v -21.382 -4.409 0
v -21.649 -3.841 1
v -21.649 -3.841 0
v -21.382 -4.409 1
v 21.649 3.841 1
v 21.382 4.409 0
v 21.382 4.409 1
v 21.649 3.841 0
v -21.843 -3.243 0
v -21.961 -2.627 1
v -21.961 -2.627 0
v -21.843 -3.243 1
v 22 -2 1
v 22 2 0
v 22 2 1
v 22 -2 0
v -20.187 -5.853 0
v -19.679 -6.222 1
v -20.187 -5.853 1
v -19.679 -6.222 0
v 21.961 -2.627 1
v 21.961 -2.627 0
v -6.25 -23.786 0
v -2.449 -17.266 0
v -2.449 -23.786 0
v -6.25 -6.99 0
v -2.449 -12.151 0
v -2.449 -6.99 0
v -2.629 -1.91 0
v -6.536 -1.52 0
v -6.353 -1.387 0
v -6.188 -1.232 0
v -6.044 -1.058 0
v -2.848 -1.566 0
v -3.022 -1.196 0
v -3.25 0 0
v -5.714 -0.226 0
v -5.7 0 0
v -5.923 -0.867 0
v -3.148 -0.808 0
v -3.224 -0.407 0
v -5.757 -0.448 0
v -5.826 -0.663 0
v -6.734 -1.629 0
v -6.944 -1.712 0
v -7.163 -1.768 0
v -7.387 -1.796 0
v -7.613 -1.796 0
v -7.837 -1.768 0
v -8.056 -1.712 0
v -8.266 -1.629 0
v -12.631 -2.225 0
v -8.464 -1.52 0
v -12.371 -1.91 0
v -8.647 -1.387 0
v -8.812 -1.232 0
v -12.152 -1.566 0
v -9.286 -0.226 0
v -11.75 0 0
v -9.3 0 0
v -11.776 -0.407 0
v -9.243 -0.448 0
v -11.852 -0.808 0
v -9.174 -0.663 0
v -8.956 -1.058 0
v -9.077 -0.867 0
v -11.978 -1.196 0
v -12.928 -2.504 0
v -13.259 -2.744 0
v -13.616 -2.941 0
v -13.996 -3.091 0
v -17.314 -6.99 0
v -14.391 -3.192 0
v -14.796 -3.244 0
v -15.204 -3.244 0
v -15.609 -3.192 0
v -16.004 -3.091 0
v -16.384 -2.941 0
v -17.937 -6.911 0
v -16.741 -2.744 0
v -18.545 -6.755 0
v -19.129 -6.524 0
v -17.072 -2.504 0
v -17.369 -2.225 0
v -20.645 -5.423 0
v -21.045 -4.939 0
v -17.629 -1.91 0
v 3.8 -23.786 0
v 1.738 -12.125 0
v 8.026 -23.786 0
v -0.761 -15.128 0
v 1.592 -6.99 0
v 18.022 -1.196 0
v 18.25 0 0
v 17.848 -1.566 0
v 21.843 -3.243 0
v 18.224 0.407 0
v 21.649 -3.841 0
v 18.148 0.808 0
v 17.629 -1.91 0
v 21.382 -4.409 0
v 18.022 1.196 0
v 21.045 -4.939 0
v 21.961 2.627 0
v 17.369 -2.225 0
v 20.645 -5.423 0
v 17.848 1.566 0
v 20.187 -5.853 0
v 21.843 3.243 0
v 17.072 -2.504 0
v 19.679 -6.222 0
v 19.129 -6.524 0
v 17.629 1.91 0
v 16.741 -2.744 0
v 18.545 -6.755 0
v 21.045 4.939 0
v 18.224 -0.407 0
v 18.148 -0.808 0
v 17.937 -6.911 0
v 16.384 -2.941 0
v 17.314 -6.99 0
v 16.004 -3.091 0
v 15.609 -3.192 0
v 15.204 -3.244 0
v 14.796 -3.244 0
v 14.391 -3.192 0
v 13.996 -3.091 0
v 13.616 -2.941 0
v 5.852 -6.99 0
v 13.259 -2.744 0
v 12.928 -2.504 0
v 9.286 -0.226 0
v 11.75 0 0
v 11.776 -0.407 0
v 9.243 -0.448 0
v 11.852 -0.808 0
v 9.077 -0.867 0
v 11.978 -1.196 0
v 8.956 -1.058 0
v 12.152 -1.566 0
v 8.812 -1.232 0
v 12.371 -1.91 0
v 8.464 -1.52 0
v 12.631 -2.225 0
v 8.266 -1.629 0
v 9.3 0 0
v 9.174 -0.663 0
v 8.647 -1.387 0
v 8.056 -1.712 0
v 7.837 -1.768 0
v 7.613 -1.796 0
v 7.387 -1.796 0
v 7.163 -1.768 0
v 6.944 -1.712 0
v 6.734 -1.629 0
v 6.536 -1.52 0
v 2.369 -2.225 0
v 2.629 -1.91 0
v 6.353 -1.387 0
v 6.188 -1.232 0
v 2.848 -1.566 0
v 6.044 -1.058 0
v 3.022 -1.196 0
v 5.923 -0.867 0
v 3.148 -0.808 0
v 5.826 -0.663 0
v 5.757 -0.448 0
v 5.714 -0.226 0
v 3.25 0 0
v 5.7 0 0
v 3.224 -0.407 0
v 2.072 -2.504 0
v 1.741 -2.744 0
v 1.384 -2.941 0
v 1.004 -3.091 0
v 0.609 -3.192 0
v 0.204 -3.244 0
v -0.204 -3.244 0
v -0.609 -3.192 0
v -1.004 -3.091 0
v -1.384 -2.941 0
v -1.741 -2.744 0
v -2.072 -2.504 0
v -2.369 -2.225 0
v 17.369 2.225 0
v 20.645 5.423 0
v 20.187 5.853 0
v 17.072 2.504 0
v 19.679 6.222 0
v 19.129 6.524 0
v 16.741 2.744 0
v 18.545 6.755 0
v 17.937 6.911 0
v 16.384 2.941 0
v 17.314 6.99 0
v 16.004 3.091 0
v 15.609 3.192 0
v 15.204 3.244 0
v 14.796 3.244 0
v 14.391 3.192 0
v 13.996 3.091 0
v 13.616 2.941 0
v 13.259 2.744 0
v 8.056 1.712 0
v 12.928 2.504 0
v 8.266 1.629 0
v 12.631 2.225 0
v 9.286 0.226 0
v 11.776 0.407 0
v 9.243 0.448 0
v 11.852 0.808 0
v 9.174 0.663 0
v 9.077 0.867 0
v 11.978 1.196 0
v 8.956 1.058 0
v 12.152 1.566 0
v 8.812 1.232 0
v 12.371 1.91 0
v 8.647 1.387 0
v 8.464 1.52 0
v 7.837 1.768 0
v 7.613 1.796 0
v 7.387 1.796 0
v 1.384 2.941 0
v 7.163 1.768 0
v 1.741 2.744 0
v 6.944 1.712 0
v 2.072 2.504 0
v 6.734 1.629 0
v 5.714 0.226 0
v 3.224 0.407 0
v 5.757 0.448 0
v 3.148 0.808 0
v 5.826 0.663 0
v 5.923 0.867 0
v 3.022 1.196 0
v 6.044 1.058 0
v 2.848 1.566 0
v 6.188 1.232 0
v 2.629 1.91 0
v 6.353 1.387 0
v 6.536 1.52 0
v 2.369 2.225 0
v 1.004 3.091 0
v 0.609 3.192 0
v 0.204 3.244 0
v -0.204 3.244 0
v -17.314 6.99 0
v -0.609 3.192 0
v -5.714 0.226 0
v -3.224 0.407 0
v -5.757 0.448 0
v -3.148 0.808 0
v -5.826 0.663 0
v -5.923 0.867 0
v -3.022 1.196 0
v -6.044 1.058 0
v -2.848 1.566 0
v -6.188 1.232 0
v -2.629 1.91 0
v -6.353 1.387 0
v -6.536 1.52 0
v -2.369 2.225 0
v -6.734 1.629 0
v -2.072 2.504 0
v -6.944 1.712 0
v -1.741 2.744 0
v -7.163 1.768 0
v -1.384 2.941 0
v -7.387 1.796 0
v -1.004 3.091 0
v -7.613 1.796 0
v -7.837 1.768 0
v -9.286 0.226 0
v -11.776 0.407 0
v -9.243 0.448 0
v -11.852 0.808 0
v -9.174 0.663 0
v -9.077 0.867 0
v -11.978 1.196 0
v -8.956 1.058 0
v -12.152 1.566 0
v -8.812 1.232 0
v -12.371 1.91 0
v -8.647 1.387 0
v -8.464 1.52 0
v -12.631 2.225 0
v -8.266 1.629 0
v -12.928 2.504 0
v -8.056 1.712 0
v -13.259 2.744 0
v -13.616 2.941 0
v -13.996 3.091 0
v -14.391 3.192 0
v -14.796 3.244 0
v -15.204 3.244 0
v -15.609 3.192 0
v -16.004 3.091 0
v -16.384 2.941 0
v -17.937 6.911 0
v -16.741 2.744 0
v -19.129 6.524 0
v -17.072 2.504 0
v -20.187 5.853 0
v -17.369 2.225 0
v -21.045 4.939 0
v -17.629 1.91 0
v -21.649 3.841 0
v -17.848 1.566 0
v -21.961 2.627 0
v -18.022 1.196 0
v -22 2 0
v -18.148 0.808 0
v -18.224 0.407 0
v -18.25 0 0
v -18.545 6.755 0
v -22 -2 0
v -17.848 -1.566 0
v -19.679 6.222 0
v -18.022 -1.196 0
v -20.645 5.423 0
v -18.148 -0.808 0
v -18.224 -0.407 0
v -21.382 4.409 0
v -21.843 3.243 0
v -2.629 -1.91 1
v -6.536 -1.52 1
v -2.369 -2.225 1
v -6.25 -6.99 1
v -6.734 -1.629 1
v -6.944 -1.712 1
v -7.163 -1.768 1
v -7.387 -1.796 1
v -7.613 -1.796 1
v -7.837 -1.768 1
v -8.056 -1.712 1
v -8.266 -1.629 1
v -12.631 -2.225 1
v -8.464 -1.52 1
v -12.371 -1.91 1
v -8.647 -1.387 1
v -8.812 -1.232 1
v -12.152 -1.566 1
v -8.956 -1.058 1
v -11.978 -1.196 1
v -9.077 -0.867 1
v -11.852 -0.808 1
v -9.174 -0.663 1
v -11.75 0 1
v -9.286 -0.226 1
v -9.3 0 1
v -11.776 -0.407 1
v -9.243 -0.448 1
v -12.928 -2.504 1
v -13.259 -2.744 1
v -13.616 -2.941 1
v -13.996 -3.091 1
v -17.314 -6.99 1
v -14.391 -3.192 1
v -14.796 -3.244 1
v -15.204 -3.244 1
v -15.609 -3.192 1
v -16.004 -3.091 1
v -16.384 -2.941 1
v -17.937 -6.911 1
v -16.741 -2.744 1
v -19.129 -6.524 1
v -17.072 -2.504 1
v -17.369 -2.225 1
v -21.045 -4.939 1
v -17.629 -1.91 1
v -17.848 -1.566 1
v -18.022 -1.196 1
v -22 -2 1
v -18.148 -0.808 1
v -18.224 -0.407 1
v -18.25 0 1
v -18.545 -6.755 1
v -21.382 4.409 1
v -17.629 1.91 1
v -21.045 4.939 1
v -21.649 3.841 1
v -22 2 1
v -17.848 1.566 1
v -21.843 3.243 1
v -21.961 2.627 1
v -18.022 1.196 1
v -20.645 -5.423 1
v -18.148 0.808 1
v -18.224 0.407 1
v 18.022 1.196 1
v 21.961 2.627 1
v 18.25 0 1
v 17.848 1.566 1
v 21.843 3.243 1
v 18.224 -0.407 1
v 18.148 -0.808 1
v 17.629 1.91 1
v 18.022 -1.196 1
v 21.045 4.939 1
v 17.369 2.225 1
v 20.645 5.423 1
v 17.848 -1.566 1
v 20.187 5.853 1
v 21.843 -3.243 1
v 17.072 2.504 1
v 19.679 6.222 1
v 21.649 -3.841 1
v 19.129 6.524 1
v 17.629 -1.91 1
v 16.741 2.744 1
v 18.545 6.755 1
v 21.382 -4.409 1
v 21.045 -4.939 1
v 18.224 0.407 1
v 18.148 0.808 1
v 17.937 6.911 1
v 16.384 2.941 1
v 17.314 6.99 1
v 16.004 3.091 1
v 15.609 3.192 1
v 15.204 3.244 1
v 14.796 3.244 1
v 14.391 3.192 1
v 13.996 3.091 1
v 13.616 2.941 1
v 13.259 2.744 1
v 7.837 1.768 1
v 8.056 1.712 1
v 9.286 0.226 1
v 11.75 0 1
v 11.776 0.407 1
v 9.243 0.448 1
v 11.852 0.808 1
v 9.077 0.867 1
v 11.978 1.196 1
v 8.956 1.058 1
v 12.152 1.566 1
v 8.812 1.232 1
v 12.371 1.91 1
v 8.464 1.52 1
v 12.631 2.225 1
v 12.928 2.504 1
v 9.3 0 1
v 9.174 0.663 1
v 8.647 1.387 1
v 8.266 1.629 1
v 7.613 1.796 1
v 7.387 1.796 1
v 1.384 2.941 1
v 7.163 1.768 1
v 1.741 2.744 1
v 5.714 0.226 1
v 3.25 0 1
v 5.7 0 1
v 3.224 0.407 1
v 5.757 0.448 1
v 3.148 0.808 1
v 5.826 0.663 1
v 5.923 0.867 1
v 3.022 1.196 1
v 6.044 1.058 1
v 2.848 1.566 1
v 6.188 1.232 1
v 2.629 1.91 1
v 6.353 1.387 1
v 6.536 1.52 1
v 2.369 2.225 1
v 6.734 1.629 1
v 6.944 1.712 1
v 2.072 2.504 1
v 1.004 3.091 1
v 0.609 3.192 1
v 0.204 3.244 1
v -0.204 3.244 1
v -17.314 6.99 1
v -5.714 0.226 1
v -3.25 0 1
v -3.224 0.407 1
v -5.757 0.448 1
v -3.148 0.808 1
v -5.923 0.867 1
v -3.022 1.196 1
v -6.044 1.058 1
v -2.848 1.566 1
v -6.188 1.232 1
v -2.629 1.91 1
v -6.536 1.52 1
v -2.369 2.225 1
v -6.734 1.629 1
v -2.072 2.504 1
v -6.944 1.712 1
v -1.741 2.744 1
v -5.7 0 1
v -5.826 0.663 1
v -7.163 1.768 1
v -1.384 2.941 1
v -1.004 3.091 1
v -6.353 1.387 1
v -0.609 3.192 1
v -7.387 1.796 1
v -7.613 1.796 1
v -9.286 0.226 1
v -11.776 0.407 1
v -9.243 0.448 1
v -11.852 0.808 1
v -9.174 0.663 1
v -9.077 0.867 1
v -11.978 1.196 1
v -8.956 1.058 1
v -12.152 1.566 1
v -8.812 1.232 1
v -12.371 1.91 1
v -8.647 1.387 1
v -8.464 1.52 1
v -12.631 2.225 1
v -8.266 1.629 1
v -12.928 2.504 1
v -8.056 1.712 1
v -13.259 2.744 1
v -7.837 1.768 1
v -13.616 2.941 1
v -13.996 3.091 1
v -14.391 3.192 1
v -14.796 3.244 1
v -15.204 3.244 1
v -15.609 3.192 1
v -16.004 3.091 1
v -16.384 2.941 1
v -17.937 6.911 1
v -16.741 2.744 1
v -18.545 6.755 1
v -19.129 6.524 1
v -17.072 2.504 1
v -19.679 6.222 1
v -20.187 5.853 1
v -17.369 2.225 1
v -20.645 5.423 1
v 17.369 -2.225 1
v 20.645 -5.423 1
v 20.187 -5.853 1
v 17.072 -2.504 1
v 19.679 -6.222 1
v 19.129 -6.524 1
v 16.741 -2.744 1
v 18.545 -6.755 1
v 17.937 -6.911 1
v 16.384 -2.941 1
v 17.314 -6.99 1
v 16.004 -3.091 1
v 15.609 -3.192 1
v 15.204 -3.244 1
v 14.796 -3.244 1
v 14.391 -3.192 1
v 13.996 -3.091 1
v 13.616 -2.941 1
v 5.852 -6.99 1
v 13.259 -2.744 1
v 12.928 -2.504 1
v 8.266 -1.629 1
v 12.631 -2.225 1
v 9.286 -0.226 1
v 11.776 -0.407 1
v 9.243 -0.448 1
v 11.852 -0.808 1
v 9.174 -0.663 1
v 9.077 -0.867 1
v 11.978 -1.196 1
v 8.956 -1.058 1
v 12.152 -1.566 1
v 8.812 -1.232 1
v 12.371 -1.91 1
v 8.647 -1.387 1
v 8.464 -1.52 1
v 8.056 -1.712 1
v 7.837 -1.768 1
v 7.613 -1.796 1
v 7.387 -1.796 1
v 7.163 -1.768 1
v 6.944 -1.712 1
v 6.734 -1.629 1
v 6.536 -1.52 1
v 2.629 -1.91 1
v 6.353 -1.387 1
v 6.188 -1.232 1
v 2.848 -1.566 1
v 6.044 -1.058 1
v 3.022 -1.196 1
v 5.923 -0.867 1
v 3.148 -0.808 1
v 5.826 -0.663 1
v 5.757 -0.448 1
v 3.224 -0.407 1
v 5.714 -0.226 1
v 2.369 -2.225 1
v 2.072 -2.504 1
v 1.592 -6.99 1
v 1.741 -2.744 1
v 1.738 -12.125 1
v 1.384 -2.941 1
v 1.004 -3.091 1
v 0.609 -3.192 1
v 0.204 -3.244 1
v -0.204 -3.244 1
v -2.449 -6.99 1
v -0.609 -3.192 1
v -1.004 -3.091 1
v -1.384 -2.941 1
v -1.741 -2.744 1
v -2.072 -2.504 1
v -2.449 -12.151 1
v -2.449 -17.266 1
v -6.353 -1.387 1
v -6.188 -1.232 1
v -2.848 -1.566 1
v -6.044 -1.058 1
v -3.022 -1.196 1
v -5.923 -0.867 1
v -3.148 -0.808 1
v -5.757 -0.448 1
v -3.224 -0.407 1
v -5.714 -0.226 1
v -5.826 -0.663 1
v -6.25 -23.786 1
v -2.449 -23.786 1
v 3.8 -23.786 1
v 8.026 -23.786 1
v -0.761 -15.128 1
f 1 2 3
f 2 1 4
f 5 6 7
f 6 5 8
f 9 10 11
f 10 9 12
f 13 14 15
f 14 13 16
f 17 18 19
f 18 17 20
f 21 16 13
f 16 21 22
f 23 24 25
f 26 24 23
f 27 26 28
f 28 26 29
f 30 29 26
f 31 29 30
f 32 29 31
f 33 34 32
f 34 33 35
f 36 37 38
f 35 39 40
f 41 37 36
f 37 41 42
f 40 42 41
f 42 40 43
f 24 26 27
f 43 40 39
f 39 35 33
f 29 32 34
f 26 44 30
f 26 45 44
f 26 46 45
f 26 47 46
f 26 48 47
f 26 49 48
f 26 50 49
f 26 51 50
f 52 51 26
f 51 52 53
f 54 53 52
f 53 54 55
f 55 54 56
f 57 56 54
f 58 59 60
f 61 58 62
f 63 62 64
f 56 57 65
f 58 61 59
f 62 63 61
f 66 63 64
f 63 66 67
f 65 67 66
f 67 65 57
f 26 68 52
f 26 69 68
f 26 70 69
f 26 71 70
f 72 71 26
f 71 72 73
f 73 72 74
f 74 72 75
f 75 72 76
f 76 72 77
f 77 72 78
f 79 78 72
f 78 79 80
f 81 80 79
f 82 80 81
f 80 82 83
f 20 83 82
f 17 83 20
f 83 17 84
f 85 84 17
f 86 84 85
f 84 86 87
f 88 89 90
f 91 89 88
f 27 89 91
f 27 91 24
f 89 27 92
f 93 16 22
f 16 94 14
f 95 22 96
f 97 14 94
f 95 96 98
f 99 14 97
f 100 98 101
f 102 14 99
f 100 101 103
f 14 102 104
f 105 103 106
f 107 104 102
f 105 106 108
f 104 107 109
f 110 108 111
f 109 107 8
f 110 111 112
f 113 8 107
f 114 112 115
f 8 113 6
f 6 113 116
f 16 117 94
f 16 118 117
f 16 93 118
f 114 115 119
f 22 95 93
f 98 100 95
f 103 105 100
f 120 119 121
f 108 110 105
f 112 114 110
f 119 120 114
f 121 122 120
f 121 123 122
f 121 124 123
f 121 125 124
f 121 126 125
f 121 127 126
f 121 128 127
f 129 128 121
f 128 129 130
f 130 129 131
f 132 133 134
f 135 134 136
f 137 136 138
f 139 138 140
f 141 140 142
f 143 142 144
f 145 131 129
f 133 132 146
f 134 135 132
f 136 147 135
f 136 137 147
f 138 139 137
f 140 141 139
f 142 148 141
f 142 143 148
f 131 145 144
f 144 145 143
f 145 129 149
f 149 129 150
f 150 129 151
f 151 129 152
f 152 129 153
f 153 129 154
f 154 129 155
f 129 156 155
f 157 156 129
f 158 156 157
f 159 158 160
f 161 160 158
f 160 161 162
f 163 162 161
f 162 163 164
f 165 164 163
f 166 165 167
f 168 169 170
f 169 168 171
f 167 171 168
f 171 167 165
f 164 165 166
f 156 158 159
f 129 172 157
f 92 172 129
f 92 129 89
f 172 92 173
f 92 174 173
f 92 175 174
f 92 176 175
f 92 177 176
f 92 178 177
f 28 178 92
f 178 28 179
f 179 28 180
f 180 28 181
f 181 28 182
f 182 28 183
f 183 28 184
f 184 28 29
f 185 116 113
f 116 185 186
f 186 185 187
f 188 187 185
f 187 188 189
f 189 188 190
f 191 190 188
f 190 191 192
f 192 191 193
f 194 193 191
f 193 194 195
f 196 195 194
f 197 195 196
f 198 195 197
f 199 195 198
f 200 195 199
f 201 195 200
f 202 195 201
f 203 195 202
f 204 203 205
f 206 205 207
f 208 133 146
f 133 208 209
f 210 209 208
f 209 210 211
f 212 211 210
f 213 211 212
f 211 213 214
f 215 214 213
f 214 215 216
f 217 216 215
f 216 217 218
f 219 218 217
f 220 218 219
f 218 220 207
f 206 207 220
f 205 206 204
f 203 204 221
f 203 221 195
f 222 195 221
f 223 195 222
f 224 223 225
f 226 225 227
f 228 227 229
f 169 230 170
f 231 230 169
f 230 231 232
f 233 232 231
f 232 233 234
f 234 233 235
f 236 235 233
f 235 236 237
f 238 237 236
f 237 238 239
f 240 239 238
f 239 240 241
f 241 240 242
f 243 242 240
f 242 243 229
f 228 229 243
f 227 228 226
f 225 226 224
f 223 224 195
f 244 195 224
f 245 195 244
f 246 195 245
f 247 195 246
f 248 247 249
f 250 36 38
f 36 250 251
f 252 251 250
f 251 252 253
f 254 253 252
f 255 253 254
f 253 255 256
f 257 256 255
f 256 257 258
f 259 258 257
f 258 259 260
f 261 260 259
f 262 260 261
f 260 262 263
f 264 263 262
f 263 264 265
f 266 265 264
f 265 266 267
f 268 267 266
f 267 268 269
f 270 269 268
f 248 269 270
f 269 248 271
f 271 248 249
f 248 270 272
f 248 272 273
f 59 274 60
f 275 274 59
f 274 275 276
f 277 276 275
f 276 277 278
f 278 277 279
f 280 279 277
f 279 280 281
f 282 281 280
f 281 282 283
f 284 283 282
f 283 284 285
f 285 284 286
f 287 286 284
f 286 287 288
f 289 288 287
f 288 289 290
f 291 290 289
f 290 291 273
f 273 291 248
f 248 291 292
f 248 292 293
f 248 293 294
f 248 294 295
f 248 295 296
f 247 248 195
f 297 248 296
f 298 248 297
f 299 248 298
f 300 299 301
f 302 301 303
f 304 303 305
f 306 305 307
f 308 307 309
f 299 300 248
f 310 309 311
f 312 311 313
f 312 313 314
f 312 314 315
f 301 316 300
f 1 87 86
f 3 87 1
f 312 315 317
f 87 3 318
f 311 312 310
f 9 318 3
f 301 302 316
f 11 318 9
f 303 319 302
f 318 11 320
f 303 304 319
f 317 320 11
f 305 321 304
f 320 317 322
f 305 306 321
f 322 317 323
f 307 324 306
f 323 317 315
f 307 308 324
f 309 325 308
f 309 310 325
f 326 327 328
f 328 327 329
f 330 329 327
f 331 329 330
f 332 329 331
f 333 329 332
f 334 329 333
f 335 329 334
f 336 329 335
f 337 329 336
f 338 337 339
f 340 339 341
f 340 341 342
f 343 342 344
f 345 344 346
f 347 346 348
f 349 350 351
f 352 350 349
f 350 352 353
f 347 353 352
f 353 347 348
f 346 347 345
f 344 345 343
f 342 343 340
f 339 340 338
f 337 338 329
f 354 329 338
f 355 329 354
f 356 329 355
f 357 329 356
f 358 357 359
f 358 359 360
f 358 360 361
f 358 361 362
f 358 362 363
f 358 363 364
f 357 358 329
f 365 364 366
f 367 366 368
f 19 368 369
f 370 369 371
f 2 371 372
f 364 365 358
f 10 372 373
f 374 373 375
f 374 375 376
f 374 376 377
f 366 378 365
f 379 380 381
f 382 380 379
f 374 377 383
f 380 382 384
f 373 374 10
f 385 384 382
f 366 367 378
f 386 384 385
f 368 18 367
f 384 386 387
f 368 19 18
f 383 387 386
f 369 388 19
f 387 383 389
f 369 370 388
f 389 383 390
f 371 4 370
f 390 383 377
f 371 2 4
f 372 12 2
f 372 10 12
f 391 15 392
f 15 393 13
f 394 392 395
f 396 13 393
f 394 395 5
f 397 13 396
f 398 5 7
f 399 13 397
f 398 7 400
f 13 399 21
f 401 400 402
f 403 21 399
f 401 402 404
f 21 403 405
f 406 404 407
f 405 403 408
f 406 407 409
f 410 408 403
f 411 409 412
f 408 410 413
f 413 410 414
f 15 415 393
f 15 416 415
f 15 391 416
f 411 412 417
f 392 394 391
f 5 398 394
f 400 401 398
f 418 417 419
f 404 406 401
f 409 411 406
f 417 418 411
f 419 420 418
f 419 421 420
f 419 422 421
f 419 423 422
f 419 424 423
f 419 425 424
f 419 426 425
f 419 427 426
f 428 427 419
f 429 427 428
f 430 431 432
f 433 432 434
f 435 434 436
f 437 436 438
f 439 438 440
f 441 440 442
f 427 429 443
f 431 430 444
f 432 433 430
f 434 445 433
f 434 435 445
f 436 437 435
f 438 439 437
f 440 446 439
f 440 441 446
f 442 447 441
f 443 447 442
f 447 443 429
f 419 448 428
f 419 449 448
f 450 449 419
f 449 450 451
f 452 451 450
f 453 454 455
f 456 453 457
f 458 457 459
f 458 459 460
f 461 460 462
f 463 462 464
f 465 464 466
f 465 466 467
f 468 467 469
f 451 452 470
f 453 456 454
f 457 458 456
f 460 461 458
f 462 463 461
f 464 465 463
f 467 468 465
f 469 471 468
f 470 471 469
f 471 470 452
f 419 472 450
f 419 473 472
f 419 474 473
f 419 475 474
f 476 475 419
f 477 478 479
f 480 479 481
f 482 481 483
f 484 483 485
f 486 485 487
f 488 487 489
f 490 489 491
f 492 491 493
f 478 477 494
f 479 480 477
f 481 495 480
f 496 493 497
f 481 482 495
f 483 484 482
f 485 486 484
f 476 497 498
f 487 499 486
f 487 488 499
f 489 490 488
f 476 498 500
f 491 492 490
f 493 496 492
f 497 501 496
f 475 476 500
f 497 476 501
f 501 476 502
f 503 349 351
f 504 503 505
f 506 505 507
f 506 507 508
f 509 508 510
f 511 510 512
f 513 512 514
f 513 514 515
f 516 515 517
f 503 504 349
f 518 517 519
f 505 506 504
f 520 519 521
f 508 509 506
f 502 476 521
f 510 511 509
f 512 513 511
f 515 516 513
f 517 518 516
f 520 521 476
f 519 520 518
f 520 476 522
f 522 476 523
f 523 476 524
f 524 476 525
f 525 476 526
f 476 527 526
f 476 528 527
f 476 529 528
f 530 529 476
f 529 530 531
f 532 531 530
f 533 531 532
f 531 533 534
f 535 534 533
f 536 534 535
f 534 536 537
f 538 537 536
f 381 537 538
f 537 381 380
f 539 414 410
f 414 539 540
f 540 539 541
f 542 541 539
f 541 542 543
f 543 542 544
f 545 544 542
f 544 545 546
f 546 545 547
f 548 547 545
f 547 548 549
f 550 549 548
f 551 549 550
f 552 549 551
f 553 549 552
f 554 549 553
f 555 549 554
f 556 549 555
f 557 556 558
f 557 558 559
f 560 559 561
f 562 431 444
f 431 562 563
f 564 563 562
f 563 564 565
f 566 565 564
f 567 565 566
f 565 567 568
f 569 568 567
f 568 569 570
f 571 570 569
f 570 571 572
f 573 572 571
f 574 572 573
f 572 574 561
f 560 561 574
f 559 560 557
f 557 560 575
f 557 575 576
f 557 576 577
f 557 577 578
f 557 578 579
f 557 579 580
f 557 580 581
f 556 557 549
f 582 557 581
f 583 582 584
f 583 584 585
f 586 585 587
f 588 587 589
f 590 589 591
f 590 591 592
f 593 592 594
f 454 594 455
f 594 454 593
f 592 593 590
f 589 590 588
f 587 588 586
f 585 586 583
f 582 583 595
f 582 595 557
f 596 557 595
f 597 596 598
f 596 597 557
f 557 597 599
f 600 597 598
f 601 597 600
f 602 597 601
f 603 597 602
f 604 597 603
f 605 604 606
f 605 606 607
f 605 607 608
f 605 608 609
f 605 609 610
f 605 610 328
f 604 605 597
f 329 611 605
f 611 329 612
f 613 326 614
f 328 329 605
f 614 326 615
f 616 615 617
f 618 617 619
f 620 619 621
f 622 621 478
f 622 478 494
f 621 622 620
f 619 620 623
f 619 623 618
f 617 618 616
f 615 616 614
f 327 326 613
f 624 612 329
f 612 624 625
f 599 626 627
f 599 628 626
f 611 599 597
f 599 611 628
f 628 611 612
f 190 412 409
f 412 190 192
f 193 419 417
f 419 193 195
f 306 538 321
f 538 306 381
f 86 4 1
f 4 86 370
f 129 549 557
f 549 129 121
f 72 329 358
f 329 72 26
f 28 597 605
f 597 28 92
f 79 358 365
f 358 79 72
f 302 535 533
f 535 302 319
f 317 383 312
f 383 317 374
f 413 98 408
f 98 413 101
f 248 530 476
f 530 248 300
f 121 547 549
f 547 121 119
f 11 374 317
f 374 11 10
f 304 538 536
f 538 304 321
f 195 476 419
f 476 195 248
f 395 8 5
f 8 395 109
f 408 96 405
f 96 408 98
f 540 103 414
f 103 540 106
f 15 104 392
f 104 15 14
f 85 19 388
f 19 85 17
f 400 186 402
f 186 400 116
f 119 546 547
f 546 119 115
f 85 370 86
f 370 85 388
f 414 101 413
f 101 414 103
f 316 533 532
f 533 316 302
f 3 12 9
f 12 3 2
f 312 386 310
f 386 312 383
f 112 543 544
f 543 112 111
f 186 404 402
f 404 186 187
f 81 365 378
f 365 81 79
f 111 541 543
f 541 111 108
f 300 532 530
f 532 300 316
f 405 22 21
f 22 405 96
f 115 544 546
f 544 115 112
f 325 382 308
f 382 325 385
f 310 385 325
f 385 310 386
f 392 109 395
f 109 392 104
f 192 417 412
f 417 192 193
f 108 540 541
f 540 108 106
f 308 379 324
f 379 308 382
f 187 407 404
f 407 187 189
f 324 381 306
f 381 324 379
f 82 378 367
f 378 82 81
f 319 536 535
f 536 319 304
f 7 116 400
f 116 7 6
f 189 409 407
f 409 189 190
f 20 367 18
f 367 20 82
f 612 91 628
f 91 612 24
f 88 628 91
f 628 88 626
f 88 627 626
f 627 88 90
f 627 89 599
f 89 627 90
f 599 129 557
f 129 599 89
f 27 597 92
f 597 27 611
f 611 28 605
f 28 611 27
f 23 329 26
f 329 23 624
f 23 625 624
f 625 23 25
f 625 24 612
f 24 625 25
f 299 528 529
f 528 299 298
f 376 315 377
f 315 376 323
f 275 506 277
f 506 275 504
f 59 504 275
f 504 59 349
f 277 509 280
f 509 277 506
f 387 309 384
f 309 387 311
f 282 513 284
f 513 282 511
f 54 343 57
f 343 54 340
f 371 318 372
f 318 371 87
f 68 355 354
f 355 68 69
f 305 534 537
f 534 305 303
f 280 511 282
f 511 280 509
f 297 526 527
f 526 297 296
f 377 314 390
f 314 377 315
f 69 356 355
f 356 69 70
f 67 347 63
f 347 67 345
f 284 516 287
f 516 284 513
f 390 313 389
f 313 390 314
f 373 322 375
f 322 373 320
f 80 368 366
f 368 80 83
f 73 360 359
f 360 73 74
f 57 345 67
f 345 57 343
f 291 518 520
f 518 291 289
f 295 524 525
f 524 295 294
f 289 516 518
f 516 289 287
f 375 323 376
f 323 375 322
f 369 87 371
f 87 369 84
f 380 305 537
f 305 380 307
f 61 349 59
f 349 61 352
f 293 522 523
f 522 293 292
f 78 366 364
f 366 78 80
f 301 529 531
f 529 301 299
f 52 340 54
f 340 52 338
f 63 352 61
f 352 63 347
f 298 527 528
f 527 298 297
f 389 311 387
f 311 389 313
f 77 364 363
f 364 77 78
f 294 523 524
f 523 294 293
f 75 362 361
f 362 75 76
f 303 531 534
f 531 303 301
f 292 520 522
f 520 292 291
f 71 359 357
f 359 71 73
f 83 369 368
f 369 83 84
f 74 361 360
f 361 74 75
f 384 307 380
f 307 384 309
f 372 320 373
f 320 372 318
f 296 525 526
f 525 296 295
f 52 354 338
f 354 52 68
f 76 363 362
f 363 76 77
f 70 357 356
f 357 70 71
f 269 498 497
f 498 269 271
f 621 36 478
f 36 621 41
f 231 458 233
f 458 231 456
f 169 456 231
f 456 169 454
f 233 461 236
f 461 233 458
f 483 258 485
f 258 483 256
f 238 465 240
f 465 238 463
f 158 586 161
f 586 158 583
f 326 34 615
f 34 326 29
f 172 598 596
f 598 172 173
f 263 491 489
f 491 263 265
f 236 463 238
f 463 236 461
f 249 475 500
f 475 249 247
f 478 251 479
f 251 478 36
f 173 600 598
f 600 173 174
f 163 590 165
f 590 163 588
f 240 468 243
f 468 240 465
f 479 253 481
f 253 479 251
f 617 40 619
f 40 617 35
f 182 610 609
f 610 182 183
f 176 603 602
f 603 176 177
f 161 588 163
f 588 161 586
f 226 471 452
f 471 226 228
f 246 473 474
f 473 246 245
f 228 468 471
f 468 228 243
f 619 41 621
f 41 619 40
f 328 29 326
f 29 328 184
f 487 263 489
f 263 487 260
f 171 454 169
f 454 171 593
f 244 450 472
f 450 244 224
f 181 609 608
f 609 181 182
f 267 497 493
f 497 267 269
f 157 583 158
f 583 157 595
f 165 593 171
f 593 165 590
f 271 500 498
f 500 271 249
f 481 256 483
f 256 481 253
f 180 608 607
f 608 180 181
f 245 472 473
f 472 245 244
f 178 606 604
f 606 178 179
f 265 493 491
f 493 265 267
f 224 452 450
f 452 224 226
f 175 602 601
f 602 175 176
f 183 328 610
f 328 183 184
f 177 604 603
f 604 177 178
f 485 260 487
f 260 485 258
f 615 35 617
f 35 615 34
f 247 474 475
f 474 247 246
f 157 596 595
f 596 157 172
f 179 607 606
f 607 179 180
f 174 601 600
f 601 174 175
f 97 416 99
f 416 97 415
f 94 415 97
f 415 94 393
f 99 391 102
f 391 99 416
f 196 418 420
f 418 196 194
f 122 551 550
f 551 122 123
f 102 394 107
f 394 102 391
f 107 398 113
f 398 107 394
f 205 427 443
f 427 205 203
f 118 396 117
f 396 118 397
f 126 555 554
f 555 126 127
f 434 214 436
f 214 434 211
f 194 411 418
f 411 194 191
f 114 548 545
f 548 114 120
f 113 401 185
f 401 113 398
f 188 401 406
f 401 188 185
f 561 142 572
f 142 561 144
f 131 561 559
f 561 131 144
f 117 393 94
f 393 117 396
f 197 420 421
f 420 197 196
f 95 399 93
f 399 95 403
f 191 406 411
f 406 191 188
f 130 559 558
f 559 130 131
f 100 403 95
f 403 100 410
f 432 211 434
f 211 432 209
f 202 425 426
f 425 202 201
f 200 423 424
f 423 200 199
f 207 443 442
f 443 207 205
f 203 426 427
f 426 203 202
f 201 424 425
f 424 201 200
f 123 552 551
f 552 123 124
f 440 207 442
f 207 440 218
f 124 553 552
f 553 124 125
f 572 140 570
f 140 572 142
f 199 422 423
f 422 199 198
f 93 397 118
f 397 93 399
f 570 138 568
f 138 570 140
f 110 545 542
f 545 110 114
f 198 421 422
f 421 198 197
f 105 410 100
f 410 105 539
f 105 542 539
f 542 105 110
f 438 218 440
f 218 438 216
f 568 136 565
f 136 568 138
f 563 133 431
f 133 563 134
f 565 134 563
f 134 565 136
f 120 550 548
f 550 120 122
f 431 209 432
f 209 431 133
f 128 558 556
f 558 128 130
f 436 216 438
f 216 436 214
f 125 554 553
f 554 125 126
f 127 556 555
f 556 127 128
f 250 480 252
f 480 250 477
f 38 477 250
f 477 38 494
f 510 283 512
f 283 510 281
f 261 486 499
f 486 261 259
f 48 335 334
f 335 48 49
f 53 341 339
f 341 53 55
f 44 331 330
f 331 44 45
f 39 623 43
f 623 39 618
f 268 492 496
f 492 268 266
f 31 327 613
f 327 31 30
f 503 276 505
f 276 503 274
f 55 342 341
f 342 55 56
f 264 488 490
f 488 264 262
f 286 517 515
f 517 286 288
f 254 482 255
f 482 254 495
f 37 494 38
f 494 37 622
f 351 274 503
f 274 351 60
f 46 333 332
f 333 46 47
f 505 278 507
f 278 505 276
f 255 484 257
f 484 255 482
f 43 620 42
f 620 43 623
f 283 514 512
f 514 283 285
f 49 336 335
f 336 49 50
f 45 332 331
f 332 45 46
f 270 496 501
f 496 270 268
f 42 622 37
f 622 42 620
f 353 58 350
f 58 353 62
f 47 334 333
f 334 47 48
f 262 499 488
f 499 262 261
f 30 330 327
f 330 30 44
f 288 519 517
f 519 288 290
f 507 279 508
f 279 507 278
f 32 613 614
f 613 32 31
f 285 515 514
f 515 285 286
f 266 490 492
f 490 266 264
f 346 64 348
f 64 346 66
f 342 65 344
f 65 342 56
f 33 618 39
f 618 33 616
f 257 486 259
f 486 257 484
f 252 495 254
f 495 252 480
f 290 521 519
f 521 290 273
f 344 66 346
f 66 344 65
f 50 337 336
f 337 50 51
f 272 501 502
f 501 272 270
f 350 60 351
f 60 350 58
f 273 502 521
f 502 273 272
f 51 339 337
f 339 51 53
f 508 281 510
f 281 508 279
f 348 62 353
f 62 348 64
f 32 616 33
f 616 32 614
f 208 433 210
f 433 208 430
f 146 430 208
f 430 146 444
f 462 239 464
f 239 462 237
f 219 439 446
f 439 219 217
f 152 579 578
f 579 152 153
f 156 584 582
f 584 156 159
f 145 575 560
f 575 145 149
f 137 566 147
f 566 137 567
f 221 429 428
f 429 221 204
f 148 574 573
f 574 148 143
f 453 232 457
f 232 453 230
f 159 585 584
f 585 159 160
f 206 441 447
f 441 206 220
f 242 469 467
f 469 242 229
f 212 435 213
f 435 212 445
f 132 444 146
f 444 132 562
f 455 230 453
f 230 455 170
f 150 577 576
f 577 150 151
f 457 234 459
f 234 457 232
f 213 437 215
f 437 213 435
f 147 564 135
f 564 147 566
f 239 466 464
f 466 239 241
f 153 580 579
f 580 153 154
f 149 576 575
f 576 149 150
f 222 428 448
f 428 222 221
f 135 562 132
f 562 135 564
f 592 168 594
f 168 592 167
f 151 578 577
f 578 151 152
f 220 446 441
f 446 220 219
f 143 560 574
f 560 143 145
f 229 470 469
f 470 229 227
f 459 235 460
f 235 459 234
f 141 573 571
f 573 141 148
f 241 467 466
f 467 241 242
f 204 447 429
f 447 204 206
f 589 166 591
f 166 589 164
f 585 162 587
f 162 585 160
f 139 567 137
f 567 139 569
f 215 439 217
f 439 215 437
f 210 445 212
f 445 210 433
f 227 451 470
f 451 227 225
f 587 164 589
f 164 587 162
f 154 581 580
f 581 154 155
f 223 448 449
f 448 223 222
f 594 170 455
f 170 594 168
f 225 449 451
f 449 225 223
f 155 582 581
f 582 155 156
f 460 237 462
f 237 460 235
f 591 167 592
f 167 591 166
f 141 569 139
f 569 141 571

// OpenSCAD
$fn = 50;


difference() {
	union() {
		*color(alpha = 1.0000000000, c = "gray") {
			translate(v = [0, 14, 0]) {
				linear_extrude(height = 1) {
					text(font = "Arial:style=Bold", halign = "center", size = 4.5000000000, text = "COMMENT description oobb_plate_shape_p_type_1_depth_3_width_1_thickness_k_extra_oobb_size", valign = "center");
				}
			}
		}
		hull() {
			translate(v = [-17.0000000000, 2.0000000000, 0]) {
				cylinder(h = 1, r = 5);
			}
			translate(v = [17.0000000000, 2.0000000000, 0]) {
				cylinder(h = 1, r = 5);
			}
			translate(v = [-17.0000000000, -2.0000000000, 0]) {
				cylinder(h = 1, r = 5);
			}
			translate(v = [17.0000000000, -2.0000000000, 0]) {
				cylinder(h = 1, r = 5);
			}
		}
		translate(v = [0, -5, 0]) {
			linear_extrude(height = 1) {
				text(font = "DejaVu Sans Mono:style=Bold", halign = "center", size = 19.0000000000, text = "K", valign = "top");
			}
		}
	}
	union() {
		*color(alpha = 1.0000000000, c = "gray") {
			translate(v = [0, 14, 0]) {
				linear_extrude(height = 1) {
					text(font = "Arial:style=Bold", halign = "center", size = 4.5000000000, text = "COMMENT description oobb_holes_shape_n_type_3_width_1_thickness_k_extra_oobb_size_1_height_'all'_holes_true_both_holes", valign = "center");
				}
			}
		}
		translate(v = [-15.0000000000, 0.0000000000, 0]) {
			translate(v = [0, 0, -50]) {
				cylinder(h = 100, r = 3.2500000000);
			}
		}
		translate(v = [0, 0, -50]) {
			cylinder(h = 100, r = 3.2500000000);
		}
		translate(v = [15.0000000000, 0.0000000000, 0]) {
			translate(v = [0, 0, -50]) {
				cylinder(h = 100, r = 3.2500000000);
			}
		}
		translate(v = [-15.0000000000, 0.0000000000, 0]) {
			translate(v = [0, 0, -50]) {
				cylinder(h = 100, r = 1.8000000000);
			}
		}
		translate(v = [-7.5000000000, 0.0000000000, 0]) {
			translate(v = [0, 0, -50]) {
				cylinder(h = 100, r = 1.8000000000);
			}
		}
		translate(v = [0, 0, -50]) {
			cylinder(h = 100, r = 1.8000000000);
		}
		translate(v = [7.5000000000, 0.0000000000, 0]) {
			translate(v = [0, 0, -50]) {
				cylinder(h = 100, r = 1.8000000000);
			}
		}
		translate(v = [15.0000000000, 0.0000000000, 0]) {
			translate(v = [0, 0, -50]) {
				cylinder(h = 100, r = 1.8000000000);
			}
		}
	}
}
